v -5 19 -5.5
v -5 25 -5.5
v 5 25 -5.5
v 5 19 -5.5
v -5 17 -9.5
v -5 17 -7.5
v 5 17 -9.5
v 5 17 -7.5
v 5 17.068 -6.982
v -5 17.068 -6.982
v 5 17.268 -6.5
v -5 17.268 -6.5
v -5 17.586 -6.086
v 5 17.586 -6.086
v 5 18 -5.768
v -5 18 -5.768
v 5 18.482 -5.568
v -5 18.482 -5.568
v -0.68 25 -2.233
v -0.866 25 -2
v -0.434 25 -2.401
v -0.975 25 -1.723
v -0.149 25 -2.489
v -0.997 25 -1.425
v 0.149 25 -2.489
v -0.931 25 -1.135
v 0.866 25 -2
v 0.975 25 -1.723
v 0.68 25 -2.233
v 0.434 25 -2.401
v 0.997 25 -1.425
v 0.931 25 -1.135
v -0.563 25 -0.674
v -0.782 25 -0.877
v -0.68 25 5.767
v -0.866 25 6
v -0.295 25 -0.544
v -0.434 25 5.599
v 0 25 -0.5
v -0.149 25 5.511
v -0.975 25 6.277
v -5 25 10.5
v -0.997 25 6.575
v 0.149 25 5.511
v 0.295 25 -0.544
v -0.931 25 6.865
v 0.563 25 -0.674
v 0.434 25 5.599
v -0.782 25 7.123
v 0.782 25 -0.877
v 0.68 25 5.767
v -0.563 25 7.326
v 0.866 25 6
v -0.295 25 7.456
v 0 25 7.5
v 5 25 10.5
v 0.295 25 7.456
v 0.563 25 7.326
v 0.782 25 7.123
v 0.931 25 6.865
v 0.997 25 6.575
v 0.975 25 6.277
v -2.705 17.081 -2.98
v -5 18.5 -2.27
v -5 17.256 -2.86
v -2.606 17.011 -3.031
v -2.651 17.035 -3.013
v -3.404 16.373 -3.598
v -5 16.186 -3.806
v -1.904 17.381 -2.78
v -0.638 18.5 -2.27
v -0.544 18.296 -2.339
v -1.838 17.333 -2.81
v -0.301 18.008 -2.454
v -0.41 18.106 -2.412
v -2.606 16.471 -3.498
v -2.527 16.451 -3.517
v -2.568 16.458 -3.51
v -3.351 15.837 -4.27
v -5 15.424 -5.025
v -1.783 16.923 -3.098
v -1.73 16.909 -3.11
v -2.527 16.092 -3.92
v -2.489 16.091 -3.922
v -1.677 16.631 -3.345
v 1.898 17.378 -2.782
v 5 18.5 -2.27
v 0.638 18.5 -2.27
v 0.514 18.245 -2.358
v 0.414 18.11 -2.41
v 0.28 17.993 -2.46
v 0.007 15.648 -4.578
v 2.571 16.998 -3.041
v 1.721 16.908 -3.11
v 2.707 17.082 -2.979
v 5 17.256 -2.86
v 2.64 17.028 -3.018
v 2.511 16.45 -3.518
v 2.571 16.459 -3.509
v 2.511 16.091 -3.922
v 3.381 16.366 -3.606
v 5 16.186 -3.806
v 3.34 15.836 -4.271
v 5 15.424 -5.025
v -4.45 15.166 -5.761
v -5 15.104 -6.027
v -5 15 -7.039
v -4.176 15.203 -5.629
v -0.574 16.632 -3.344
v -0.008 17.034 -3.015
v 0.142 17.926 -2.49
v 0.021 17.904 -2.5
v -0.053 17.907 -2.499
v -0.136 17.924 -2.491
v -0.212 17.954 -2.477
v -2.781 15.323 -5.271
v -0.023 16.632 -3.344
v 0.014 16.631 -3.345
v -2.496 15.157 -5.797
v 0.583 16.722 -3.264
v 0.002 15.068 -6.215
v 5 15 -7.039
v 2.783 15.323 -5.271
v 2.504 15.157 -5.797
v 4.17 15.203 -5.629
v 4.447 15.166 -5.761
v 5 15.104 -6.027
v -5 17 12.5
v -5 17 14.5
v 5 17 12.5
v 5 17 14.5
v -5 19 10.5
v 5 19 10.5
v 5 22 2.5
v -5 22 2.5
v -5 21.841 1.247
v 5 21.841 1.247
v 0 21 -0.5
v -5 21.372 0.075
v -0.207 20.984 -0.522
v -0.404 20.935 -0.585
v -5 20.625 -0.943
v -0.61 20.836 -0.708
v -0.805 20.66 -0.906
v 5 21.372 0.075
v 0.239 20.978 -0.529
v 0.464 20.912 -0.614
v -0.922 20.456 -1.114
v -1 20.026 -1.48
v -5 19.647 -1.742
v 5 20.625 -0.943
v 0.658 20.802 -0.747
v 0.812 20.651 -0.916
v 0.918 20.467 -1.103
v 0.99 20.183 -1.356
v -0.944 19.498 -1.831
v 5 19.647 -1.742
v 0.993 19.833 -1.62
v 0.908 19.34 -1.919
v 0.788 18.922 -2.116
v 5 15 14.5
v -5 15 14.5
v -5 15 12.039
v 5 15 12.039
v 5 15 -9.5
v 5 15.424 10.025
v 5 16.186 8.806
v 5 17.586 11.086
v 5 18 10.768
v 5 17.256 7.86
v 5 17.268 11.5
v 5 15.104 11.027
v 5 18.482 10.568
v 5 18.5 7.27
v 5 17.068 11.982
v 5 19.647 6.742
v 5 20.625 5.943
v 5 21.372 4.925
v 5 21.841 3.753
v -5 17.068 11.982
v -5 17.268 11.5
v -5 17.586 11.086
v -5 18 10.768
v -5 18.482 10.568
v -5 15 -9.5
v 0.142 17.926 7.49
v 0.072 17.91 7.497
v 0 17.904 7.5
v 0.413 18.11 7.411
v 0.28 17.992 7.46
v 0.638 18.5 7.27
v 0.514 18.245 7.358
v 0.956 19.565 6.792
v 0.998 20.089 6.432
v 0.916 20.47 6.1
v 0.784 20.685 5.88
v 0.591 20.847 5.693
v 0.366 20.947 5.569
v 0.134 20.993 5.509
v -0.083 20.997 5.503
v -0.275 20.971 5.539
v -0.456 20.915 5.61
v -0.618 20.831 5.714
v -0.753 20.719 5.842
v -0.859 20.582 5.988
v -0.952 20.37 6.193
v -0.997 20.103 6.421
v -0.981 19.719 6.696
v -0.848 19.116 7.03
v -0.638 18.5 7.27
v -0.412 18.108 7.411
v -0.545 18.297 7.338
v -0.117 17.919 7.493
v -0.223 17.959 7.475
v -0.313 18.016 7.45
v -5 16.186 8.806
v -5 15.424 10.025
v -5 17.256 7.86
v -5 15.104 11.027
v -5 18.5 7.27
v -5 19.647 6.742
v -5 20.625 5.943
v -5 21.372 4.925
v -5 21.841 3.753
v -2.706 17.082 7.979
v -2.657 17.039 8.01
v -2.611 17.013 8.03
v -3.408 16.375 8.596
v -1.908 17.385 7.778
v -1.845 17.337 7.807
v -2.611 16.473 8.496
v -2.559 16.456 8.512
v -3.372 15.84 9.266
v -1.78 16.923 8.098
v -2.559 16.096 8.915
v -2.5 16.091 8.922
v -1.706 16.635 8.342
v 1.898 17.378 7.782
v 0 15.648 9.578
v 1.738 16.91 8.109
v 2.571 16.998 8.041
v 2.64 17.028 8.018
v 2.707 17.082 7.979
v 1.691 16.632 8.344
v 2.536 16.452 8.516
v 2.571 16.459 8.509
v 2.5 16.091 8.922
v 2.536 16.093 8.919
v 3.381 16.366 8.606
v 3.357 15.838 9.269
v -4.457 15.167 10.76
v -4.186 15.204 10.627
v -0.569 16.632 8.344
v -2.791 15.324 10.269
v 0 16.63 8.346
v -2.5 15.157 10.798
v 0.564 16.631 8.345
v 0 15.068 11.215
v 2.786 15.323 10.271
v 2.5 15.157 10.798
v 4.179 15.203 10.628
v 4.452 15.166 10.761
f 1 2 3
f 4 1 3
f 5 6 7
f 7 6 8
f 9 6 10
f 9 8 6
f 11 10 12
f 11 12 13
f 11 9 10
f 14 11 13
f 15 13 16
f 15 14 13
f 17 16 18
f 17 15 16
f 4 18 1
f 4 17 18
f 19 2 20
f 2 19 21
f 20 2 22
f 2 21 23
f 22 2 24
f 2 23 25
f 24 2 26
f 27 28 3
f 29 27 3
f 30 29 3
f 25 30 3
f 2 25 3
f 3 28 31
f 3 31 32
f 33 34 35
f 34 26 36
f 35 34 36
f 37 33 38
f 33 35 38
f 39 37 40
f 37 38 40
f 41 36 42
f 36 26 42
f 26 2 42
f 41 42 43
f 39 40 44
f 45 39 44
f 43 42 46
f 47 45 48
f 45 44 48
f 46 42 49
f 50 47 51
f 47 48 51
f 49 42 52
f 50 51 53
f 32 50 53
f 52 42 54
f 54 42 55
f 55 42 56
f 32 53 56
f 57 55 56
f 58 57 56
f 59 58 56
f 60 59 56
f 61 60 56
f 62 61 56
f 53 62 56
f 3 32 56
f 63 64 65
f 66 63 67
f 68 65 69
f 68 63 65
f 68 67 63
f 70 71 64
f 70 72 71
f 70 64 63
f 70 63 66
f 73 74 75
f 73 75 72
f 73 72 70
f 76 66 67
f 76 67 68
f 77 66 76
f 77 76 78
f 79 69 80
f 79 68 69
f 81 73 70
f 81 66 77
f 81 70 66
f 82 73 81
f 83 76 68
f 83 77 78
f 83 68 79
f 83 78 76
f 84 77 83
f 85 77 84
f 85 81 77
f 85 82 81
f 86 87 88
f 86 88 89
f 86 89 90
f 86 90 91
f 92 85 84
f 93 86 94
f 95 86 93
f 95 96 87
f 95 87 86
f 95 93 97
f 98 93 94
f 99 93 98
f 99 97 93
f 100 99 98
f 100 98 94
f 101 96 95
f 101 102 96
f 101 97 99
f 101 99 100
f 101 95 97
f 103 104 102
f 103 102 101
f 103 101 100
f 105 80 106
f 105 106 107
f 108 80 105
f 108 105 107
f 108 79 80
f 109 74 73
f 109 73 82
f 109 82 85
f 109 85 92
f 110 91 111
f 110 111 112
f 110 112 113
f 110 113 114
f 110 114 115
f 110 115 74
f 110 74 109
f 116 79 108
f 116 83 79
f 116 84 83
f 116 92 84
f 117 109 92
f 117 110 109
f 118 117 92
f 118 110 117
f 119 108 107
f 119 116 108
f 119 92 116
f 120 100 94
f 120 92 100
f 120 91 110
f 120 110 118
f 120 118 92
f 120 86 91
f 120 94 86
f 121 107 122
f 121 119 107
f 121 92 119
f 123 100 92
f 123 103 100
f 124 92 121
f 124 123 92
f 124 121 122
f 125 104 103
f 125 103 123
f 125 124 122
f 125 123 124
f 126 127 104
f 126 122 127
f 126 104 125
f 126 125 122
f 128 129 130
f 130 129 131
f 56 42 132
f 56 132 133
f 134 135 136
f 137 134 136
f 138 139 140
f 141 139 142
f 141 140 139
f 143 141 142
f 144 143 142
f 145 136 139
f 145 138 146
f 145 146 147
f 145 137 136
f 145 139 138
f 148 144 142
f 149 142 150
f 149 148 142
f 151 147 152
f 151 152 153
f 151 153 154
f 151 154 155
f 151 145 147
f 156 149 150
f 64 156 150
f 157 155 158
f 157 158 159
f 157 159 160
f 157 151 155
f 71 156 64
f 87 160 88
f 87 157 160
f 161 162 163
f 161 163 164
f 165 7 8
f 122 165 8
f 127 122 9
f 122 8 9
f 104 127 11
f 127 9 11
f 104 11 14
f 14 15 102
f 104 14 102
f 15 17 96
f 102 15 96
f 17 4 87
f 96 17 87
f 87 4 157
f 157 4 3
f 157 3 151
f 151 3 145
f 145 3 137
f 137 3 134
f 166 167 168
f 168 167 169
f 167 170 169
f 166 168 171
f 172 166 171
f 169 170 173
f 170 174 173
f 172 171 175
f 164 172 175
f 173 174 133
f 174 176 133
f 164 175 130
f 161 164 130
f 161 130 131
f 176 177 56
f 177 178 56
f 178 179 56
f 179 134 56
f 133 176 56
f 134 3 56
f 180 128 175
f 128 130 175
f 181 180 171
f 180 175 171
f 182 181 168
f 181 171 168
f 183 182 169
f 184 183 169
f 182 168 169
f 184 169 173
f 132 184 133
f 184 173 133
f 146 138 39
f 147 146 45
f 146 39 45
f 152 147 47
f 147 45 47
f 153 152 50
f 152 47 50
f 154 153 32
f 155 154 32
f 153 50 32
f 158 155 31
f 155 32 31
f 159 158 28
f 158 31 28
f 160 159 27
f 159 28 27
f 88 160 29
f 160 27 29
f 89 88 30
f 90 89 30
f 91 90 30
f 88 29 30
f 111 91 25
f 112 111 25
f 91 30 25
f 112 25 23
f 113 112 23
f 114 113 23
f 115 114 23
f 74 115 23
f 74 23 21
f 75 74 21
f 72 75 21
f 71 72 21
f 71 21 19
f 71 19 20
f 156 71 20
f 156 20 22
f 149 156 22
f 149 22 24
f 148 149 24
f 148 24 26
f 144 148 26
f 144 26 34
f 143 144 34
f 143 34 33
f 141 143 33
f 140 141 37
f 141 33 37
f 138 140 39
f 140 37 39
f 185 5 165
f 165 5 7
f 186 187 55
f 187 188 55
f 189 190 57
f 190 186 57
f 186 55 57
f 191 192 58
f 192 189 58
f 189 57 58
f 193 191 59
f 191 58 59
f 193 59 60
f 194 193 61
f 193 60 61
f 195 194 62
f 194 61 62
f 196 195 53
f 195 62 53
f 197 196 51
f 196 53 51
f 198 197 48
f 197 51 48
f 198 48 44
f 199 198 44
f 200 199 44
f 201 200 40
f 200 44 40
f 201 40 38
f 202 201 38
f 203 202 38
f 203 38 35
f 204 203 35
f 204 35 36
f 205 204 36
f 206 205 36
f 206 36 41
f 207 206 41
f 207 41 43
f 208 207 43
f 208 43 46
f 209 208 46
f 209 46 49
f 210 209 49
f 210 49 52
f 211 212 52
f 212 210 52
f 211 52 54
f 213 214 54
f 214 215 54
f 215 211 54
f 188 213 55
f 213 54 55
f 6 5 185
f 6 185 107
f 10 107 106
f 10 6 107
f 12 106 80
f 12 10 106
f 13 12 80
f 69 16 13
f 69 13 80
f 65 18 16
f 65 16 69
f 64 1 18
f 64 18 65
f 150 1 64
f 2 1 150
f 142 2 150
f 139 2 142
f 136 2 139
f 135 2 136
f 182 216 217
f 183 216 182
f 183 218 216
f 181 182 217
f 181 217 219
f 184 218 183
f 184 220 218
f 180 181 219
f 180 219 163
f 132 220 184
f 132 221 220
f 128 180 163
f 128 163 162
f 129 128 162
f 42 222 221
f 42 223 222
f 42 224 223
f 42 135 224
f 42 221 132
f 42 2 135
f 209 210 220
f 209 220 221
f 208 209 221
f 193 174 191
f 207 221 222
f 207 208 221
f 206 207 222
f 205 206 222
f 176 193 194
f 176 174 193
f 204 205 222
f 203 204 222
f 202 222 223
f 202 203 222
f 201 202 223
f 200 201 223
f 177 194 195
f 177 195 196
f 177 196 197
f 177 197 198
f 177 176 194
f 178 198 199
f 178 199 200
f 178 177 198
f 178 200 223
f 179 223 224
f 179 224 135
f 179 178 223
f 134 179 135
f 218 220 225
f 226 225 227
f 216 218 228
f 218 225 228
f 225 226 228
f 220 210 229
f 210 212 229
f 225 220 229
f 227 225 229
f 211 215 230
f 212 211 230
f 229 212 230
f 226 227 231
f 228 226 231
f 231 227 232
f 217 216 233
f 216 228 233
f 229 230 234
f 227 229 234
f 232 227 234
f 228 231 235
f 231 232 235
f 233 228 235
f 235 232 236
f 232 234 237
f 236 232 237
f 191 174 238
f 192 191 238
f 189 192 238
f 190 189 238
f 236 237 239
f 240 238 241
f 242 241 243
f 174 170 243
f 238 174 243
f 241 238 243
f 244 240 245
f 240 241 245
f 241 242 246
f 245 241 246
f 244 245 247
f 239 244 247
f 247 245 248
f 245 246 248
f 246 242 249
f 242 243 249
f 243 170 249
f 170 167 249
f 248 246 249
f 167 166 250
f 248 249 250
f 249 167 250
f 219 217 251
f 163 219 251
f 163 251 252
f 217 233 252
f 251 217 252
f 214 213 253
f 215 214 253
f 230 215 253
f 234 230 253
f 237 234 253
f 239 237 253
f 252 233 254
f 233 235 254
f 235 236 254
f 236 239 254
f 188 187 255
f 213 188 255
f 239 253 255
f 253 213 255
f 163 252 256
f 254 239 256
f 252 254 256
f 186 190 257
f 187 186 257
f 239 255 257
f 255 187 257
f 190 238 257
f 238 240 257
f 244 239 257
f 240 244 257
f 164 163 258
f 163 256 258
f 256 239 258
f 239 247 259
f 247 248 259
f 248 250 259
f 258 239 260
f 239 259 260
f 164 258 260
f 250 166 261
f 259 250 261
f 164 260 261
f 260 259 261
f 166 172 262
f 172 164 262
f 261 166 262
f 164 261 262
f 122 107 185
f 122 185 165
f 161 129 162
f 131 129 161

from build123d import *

# Parameters (mm, degrees)
SKETCH1_W           = 10
SKETCH1_H           = 16
BOSS_EXTRUDE1_DEPTH = 3
SKETCH2_W           = 10
SKETCH2_H           = 3
BOSS_EXTRUDE2_DEPTH = 5
SKETCH3_W           = 10
SKETCH3_H           = 7
BOSS_EXTRUDE3_DEPTH = 2
FILLET1_R           = 5
FILLET2_R           = 5
FILLET3_R           = 2
SKETCH4_R           = 1
CUT_EXTRUDE1_DEPTH  = 19.309833585


with BuildPart() as part:
    # Sketch1 → Boss-Extrude1 (new body)
    with BuildSketch(Plane.XZ.offset(-25)):
        with Locations((0, 2.5)):
            Rectangle(SKETCH1_W, SKETCH1_H)
    extrude(amount=BOSS_EXTRUDE1_DEPTH)

    # Sketch2 → Boss-Extrude2 (add)
    with BuildSketch(Plane.XZ.offset(-22)):
        with Locations((0, -4)):
            Rectangle(SKETCH2_W, SKETCH2_H)
        with Locations((0, 9)):
            Rectangle(SKETCH2_W, SKETCH2_H)
    extrude(amount=BOSS_EXTRUDE2_DEPTH)

    # Sketch3 → Boss-Extrude3 (add)
    with BuildSketch(Plane.XZ.offset(-17)):
        with Locations((0, 11)):
            Rectangle(SKETCH3_W, SKETCH3_H)
        with Locations((0, -6)):
            Rectangle(SKETCH3_W, SKETCH3_H)
    extrude(amount=BOSS_EXTRUDE3_DEPTH)

    # Fillet1
    fillet1_edges = [part.edges().sort_by_distance(p)[0] for p in [
        (0, 22, 7.5),
        (0, 22, -2.5),
    ]]
    fillet(fillet1_edges, radius=FILLET1_R - 0.0001)  # a hair under: the kernel refuses the full size

    # Fillet2
    fillet2_edges = [part.edges().sort_by_distance(p)[0] for p in [
        (0, 15, -2.5),
        (0, 15, 7.5),
    ]]
    fillet(fillet2_edges, radius=FILLET2_R)

    # Fillet3
    fillet3_edges = [part.edges().sort_by_distance(p)[0] for p in [
        (0, 17, -5.5),
        (0, 17, 10.5),
    ]]
    fillet(fillet3_edges, radius=FILLET3_R)

    # Sketch4 → Cut-Extrude1 (cut, through all)
    with BuildSketch(Plane(origin=(0, 25, 0), x_dir=(1, 0, 0), z_dir=(0, 1, 0))):
        with Locations(Location((0, 1.5, 0), (0, 0, 270))):
            Circle(SKETCH4_R)
        with Locations(Location((0, -6.5, 0), (0, 0, 270))):
            Circle(SKETCH4_R)
    extrude(amount=-CUT_EXTRUDE1_DEPTH, mode=Mode.SUBTRACT)


solid = part.part
